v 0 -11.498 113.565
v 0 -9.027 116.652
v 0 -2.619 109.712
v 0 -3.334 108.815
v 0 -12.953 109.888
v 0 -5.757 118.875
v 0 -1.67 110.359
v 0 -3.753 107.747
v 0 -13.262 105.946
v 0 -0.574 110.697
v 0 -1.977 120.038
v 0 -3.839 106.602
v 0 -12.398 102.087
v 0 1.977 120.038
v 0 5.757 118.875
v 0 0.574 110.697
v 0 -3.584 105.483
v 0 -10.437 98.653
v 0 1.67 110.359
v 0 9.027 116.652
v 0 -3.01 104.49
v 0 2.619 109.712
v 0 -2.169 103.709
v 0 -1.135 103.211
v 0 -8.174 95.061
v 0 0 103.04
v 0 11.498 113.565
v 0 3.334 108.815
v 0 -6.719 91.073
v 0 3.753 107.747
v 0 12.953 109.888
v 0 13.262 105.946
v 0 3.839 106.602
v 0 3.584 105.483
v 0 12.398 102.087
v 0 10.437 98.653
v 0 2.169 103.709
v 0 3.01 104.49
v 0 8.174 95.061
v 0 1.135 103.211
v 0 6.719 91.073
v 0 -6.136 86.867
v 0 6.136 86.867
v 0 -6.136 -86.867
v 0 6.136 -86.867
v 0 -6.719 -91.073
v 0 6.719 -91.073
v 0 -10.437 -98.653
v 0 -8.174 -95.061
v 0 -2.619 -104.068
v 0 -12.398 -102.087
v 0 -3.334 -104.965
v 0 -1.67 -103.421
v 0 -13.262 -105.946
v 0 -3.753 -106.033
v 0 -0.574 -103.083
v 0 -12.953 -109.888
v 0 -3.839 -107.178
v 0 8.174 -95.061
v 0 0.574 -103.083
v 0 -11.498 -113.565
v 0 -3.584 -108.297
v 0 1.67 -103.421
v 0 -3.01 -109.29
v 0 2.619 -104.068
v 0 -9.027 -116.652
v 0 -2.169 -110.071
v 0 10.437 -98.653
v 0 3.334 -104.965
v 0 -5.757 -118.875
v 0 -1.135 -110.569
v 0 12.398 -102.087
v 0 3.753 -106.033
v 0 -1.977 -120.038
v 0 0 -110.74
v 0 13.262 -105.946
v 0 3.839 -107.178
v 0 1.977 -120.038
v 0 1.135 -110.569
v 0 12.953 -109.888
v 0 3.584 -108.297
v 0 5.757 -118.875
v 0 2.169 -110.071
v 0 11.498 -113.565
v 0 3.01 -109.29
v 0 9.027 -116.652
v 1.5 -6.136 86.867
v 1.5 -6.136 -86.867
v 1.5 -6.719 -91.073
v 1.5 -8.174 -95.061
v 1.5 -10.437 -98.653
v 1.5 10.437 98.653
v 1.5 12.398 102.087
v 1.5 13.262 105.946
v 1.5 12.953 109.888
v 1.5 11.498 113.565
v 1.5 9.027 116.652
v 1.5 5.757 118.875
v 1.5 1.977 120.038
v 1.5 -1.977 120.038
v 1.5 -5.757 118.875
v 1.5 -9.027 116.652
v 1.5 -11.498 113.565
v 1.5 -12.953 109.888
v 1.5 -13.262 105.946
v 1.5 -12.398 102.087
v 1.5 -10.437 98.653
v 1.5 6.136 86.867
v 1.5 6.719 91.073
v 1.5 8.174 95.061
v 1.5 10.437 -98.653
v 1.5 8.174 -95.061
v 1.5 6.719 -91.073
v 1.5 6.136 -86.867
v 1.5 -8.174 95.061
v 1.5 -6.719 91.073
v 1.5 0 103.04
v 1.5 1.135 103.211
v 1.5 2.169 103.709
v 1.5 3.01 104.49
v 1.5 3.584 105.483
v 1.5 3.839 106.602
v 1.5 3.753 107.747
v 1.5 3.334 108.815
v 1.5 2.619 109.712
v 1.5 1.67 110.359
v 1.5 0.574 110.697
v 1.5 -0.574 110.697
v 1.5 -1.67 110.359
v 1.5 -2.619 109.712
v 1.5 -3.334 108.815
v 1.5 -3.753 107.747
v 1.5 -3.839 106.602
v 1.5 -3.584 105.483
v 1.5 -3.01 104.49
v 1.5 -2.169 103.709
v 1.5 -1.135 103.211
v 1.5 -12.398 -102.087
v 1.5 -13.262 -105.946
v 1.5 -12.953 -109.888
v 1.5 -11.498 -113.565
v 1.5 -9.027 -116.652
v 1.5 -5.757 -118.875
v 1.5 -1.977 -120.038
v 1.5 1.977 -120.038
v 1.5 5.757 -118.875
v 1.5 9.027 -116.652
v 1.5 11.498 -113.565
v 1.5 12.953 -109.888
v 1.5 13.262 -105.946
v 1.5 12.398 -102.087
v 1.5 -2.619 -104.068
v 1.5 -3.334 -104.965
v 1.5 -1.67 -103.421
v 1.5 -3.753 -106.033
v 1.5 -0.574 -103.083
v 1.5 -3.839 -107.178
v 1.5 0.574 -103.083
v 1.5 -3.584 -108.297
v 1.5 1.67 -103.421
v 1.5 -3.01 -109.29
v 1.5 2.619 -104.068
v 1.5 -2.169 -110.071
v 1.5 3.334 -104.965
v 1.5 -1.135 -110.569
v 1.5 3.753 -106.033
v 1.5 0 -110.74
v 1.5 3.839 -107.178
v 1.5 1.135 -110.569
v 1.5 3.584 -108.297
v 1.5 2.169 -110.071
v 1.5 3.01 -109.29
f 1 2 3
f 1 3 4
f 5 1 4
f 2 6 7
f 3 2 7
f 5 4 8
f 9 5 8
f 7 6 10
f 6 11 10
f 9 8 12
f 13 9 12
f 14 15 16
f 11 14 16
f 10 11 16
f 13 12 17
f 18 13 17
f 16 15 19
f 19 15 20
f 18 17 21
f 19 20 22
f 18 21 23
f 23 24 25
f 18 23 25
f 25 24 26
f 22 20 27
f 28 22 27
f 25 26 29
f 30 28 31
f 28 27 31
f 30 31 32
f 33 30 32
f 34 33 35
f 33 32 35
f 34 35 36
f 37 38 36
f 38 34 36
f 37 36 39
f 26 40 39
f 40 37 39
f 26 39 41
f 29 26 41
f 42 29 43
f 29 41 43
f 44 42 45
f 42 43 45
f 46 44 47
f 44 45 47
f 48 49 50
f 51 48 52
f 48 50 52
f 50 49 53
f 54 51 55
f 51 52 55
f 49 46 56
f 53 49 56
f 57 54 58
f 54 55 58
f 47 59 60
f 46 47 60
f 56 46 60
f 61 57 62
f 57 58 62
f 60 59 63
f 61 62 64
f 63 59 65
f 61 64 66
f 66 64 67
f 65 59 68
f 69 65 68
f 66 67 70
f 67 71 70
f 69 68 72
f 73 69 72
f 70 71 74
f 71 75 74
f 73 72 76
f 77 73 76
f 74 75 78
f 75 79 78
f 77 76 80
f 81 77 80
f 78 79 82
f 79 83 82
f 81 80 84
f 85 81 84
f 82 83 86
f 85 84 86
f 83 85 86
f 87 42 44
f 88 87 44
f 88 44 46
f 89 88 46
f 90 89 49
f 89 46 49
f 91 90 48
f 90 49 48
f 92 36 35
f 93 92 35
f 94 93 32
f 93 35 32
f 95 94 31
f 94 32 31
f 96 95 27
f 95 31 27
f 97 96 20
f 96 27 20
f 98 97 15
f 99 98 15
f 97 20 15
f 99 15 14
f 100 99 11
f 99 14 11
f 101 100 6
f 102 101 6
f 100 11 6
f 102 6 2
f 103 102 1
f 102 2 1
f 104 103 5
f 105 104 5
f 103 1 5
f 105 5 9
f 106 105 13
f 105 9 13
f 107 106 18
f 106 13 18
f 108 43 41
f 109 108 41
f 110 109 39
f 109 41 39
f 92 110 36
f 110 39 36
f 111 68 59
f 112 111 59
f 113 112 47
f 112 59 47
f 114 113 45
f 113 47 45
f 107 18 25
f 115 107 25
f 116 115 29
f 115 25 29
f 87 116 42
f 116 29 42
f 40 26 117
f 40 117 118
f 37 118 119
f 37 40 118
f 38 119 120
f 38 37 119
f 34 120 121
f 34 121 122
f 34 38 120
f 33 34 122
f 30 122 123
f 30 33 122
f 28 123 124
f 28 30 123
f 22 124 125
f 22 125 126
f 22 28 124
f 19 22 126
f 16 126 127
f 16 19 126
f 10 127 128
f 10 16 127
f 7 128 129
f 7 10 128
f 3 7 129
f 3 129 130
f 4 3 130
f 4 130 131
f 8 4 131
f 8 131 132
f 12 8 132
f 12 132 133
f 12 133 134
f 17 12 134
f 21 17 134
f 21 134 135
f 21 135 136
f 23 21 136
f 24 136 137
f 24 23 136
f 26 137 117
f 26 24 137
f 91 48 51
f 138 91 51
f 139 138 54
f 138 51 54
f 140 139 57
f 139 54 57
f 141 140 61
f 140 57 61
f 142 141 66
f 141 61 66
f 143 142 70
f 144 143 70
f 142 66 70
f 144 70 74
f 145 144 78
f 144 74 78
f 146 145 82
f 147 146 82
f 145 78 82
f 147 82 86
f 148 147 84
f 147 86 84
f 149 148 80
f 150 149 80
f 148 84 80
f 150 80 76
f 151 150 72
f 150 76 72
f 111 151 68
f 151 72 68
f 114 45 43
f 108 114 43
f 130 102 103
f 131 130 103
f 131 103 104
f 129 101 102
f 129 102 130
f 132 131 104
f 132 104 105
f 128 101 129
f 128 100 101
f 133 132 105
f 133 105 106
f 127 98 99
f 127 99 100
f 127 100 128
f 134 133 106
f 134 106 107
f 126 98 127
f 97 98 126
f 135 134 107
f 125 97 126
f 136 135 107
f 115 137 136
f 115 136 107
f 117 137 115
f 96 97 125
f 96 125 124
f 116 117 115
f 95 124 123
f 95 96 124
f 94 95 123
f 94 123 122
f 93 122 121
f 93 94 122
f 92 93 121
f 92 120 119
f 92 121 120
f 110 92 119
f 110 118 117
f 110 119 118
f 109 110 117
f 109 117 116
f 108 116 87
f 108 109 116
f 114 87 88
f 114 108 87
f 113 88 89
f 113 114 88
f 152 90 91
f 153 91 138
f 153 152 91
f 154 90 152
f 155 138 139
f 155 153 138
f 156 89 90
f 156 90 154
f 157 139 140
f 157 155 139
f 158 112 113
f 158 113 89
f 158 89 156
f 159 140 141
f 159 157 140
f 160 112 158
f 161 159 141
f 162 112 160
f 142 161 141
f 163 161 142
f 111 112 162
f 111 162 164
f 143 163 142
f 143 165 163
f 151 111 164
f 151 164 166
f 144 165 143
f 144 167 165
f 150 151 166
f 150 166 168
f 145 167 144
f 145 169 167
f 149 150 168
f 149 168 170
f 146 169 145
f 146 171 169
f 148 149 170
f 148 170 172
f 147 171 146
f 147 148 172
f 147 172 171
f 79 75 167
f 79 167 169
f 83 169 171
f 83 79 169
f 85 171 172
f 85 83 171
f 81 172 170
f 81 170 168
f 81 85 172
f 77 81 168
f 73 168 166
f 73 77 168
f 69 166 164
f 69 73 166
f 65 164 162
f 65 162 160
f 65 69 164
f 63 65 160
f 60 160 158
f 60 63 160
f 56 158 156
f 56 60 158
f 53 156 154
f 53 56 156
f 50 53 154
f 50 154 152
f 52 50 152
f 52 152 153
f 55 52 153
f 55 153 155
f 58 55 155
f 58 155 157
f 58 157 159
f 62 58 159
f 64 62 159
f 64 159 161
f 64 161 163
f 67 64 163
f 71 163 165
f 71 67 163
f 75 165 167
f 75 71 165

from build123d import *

# Parameters (mm, degrees)
SKETCH_2_R      = 3.85
EXTRUDE_1_DEPTH = 1.5


with BuildPart() as part:
    # 草圖2 → 填料-伸長1 (new body)
    with BuildSketch(Plane(origin=(0, 0, 0), x_dir=(0, 0, -1), z_dir=(1, 0, 0))):
        with BuildLine():
            Line((86.867278103, 6.136277943), (-86.867278103, 6.136277943))
            ThreePointArc((-86.867278103, 6.136277943), (-93.10532064, 7.340711326), (-98.653191396, 10.436670715))
            ThreePointArc((-98.653191396, 10.436670715), (-120.185454546, 0), (-98.653191396, -10.436670715))
            ThreePointArc((-98.653191396, -10.436670715), (-93.10532064, -7.340711326), (-86.867278103, -6.136277943))
            Line((-86.867278103, -6.136277943), (86.867278103, -6.136277943))
            ThreePointArc((86.867278103, -6.136277943), (93.10532064, -7.340711326), (98.653191396, -10.436670715))
            ThreePointArc((98.653191396, -10.436670715), (120.185454546, 0), (98.653191396, 10.436670715))
            ThreePointArc((98.653191396, 10.436670715), (93.10532064, 7.340711326), (86.867278103, 6.136277943))
        make_face()
        with Locations((-106.89, 0)):
            Circle(SKETCH_2_R, mode=Mode.SUBTRACT)
        with Locations((106.89, 0)):
            Circle(SKETCH_2_R, mode=Mode.SUBTRACT)
    extrude(amount=EXTRUDE_1_DEPTH)


solid = part.part
